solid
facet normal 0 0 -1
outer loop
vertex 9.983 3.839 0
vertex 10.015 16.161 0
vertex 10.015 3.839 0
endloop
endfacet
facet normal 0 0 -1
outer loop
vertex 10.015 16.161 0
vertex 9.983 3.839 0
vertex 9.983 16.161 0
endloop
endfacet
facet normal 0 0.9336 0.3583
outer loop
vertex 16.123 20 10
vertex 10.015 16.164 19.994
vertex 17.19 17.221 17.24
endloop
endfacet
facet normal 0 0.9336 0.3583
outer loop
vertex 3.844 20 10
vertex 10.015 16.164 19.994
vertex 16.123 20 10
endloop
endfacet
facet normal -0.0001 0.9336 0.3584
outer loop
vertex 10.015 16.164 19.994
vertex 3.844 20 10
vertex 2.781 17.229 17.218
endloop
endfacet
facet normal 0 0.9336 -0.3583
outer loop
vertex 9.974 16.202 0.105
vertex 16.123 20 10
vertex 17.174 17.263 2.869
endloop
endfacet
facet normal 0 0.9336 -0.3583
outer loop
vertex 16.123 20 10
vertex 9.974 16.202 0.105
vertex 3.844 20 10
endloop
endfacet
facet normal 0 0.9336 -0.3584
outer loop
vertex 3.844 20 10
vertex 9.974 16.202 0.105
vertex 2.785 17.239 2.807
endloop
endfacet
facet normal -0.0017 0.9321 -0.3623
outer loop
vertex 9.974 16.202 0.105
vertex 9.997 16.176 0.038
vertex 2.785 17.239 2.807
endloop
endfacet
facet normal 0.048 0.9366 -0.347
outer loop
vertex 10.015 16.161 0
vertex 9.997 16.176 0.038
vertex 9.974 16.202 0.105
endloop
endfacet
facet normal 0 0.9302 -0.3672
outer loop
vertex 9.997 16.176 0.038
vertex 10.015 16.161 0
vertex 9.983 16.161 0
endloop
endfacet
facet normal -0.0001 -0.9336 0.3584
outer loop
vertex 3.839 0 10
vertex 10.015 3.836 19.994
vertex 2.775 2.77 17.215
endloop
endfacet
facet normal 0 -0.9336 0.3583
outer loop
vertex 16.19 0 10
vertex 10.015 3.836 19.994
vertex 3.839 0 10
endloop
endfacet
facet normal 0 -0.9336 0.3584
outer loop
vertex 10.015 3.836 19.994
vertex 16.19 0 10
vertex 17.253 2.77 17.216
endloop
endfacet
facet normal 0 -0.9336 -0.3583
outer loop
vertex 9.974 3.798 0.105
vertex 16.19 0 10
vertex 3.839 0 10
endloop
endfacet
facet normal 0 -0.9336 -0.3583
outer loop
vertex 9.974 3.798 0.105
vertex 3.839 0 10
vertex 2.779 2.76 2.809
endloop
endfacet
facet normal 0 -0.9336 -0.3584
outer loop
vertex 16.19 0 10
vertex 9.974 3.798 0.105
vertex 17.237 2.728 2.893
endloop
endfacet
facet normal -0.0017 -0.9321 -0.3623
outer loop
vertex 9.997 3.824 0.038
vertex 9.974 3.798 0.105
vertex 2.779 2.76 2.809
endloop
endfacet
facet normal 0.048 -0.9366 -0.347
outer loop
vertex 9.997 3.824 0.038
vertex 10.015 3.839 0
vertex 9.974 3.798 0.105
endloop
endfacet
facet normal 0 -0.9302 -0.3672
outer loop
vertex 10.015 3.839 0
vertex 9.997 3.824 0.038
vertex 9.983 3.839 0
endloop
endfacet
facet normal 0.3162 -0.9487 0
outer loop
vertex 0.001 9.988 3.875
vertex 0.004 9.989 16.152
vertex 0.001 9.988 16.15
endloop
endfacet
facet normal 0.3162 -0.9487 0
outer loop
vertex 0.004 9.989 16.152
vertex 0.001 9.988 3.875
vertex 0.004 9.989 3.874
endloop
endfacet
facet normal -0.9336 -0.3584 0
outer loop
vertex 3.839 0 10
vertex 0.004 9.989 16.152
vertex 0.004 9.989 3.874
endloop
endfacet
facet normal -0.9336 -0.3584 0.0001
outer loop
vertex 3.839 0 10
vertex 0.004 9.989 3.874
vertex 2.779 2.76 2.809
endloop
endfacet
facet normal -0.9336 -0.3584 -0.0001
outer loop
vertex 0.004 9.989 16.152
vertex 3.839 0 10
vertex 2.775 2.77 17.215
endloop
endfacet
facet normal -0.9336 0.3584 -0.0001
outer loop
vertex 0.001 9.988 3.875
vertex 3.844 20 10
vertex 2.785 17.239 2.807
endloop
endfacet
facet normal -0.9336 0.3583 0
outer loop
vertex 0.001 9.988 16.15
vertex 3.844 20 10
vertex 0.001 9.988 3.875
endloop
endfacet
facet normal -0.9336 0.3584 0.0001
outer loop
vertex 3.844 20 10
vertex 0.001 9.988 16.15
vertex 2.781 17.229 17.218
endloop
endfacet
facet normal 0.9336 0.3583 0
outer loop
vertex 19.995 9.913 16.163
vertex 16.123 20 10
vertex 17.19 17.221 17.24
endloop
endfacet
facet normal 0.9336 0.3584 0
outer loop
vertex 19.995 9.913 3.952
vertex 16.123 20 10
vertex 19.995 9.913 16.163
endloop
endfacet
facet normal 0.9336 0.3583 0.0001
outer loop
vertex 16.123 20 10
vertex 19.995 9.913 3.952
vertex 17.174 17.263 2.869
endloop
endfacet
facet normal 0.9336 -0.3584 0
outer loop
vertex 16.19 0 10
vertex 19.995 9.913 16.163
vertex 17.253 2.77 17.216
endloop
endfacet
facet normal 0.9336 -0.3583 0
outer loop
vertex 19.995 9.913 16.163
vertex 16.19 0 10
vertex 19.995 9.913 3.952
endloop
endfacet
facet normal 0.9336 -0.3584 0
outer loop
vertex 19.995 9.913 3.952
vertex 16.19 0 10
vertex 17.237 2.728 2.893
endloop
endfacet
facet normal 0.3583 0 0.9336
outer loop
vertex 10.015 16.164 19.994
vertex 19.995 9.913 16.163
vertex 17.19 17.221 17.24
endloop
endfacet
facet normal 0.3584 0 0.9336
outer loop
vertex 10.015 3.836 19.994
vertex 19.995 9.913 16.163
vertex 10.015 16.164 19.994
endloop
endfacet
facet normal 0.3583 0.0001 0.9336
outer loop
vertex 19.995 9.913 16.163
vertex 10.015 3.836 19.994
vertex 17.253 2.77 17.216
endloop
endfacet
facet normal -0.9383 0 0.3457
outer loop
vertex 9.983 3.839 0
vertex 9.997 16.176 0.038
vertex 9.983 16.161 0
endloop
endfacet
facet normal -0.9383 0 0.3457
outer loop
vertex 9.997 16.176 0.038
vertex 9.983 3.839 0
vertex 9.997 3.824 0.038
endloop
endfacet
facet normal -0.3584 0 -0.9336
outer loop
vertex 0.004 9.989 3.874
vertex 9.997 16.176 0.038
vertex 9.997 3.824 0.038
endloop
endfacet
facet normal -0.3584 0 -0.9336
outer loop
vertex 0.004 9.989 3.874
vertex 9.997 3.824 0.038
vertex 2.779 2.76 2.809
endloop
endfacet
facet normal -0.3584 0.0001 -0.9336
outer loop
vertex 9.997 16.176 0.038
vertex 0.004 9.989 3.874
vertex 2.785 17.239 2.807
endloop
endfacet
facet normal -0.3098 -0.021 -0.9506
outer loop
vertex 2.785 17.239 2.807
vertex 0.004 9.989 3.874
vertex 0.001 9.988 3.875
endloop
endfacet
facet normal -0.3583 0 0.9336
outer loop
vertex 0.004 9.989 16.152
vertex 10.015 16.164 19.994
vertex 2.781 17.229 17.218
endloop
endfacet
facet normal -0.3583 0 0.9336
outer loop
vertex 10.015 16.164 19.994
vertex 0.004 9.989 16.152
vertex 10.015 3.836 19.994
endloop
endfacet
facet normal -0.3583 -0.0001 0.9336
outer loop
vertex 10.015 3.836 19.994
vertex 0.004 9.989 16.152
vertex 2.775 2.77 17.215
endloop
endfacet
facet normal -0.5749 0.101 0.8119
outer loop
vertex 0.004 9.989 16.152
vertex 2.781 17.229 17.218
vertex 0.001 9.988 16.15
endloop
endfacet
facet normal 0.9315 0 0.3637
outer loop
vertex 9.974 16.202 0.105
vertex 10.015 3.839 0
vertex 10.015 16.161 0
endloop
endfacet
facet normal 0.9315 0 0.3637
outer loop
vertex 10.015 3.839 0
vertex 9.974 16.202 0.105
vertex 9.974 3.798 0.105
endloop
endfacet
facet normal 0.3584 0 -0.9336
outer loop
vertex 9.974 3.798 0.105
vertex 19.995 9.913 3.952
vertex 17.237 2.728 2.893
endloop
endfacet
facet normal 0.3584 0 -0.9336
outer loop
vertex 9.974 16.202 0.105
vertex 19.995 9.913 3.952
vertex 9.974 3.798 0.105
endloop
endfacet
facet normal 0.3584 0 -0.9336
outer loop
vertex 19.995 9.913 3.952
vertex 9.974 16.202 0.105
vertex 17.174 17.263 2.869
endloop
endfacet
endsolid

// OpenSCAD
difference() {
    cube([20,20,20]);
    translate([-.5,20,10]) rotate([21,0,0]) cube([21,20,20]);
    translate([20.5,20,10]) rotate([21,180,0]) cube([21,20,20]);
    translate([20.5,0,10]) rotate([21,0,180]) cube([21,20,20]);
    translate([-.5,0,10]) rotate([21,180,180]) cube([21,20,20]);
    translate([-11.5,-15.85,-.5]) rotate([0,0,21]) cube([20,20,21]);
    translate([-18.73,17,-.5]) rotate([0,0,-21]) cube([20,20,21]);
    translate([20,9.9,-.5]) rotate([0,0,21]) cube([20,20,21]);
    translate([12.85,-8.7,-.5]) rotate([0,0,-21]) cube([20,20,21]);
    translate([10,0,20]) rotate([0,21,0]) cube([20,20,21]);
    translate([-16.2,0,-12.4]) rotate([0,21,0]) cube([20,20,21]);
    translate([0,0,16.15]) rotate([0,-21,0]) cube([20,20,21]);
    translate([17.5,0,-19.5]) rotate([0,-21,0]) cube([20,20,21]);
}
